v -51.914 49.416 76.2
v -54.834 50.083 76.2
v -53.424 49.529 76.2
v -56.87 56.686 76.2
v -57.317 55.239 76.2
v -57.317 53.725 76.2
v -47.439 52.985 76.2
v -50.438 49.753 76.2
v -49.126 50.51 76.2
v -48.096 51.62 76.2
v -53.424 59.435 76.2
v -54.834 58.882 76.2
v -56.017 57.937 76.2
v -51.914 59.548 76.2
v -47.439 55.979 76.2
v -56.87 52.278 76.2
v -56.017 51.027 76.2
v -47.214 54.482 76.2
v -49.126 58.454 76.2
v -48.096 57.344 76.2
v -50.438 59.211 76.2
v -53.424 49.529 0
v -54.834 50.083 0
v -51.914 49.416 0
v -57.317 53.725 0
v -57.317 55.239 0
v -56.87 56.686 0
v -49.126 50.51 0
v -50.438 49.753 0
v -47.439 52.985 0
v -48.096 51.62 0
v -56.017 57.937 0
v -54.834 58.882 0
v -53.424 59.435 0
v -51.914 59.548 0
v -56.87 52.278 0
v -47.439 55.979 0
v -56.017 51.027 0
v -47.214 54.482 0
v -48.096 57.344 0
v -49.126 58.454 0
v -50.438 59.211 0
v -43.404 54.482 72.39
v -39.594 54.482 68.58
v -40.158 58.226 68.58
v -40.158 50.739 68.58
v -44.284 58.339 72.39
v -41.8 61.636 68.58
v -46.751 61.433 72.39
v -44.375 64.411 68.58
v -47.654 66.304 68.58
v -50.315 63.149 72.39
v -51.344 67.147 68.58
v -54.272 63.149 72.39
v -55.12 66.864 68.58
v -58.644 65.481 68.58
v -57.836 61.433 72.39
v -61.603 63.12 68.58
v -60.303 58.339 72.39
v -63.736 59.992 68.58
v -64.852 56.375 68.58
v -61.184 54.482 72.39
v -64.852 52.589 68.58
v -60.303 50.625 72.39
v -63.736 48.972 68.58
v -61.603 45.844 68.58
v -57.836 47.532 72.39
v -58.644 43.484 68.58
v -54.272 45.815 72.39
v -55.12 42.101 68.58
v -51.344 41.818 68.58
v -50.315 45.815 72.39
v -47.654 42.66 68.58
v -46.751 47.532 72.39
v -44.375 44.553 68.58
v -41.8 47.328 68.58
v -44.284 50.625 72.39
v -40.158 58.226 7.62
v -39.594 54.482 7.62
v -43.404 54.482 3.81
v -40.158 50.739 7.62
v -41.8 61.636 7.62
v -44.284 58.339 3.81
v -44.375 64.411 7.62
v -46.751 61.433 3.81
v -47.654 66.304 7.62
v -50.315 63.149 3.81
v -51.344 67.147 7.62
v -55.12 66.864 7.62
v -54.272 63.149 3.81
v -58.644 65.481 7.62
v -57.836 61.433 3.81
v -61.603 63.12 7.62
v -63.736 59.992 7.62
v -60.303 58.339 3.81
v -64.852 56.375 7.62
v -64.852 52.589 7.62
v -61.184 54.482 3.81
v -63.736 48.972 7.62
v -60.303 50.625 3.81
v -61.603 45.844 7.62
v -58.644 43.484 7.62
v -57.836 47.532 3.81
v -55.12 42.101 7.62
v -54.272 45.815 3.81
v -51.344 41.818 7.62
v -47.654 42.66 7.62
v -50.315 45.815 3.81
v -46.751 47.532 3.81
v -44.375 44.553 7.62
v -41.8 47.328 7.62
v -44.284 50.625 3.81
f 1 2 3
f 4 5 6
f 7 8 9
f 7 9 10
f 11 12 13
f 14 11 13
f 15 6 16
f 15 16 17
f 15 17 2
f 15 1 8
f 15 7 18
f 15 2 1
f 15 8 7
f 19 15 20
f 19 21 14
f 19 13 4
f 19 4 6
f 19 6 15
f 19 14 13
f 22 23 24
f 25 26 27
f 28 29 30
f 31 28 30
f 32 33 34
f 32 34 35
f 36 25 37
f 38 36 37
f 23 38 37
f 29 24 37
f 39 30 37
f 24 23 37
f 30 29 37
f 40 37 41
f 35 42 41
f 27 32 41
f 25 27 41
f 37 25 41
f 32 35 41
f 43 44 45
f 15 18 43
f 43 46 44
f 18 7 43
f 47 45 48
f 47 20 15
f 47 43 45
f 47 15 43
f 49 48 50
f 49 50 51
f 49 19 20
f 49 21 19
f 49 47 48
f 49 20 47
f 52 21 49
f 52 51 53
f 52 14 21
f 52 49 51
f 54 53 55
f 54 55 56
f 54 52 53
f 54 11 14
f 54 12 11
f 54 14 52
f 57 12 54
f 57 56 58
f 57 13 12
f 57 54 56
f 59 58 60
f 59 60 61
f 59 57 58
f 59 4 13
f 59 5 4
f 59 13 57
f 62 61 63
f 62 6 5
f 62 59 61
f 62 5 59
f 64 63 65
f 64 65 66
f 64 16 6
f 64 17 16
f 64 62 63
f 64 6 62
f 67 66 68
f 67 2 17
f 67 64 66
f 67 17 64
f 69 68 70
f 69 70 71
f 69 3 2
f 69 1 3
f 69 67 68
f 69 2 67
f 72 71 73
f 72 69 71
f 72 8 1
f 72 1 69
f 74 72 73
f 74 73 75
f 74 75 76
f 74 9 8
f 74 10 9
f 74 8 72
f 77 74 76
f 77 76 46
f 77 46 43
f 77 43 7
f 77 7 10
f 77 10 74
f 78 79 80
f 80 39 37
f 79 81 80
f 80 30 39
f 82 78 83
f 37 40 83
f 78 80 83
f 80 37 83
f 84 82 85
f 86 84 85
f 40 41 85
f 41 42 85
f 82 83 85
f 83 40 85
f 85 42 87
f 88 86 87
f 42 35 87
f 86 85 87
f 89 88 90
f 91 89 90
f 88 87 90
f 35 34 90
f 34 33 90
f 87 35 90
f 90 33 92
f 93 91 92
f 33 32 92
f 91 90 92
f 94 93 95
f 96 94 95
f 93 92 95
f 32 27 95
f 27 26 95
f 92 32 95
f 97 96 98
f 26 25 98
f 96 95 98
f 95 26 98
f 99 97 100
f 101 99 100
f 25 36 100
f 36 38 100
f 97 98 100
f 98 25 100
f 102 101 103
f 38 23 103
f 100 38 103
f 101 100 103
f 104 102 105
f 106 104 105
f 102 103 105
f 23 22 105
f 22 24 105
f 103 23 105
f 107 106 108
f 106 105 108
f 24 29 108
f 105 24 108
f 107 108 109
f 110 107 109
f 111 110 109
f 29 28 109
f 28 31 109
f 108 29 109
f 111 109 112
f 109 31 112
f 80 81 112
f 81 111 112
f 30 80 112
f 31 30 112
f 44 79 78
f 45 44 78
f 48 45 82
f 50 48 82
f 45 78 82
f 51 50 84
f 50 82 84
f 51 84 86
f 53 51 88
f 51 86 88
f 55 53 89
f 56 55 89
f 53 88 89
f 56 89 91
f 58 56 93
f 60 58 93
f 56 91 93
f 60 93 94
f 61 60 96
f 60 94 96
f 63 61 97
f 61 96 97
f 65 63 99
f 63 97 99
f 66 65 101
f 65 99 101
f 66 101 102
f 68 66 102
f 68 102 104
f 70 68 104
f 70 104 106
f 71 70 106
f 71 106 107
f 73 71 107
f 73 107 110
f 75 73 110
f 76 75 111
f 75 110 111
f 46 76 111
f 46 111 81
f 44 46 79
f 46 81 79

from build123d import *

# Parameters (mm, degrees)
F0_R     = 12.7
F1_DEPTH = 76.2
F2_SIZE  = 7.62
F3_SIZE  = 7.62


with BuildPart() as f1:
    # F0 (on Top) → F1 (new body)
    with BuildSketch(Plane.XY):
        with Locations((-52.293554, 54.482132)):
            Circle(F0_R)
    extrude(amount=F1_DEPTH)

    # F2
    f2_edges = [f1.edges().sort_by_distance(p)[0] for p in [
        (-64.993554, 54.482132, 76.2),
    ]]
    chamfer(f2_edges, length=F2_SIZE)

    # F3
    f3_edges = [f1.edges().sort_by_distance(p)[0] for p in [
        (-64.993554, 54.482132, 0),
    ]]
    chamfer(f3_edges, length=F3_SIZE)


solid = f1.part
